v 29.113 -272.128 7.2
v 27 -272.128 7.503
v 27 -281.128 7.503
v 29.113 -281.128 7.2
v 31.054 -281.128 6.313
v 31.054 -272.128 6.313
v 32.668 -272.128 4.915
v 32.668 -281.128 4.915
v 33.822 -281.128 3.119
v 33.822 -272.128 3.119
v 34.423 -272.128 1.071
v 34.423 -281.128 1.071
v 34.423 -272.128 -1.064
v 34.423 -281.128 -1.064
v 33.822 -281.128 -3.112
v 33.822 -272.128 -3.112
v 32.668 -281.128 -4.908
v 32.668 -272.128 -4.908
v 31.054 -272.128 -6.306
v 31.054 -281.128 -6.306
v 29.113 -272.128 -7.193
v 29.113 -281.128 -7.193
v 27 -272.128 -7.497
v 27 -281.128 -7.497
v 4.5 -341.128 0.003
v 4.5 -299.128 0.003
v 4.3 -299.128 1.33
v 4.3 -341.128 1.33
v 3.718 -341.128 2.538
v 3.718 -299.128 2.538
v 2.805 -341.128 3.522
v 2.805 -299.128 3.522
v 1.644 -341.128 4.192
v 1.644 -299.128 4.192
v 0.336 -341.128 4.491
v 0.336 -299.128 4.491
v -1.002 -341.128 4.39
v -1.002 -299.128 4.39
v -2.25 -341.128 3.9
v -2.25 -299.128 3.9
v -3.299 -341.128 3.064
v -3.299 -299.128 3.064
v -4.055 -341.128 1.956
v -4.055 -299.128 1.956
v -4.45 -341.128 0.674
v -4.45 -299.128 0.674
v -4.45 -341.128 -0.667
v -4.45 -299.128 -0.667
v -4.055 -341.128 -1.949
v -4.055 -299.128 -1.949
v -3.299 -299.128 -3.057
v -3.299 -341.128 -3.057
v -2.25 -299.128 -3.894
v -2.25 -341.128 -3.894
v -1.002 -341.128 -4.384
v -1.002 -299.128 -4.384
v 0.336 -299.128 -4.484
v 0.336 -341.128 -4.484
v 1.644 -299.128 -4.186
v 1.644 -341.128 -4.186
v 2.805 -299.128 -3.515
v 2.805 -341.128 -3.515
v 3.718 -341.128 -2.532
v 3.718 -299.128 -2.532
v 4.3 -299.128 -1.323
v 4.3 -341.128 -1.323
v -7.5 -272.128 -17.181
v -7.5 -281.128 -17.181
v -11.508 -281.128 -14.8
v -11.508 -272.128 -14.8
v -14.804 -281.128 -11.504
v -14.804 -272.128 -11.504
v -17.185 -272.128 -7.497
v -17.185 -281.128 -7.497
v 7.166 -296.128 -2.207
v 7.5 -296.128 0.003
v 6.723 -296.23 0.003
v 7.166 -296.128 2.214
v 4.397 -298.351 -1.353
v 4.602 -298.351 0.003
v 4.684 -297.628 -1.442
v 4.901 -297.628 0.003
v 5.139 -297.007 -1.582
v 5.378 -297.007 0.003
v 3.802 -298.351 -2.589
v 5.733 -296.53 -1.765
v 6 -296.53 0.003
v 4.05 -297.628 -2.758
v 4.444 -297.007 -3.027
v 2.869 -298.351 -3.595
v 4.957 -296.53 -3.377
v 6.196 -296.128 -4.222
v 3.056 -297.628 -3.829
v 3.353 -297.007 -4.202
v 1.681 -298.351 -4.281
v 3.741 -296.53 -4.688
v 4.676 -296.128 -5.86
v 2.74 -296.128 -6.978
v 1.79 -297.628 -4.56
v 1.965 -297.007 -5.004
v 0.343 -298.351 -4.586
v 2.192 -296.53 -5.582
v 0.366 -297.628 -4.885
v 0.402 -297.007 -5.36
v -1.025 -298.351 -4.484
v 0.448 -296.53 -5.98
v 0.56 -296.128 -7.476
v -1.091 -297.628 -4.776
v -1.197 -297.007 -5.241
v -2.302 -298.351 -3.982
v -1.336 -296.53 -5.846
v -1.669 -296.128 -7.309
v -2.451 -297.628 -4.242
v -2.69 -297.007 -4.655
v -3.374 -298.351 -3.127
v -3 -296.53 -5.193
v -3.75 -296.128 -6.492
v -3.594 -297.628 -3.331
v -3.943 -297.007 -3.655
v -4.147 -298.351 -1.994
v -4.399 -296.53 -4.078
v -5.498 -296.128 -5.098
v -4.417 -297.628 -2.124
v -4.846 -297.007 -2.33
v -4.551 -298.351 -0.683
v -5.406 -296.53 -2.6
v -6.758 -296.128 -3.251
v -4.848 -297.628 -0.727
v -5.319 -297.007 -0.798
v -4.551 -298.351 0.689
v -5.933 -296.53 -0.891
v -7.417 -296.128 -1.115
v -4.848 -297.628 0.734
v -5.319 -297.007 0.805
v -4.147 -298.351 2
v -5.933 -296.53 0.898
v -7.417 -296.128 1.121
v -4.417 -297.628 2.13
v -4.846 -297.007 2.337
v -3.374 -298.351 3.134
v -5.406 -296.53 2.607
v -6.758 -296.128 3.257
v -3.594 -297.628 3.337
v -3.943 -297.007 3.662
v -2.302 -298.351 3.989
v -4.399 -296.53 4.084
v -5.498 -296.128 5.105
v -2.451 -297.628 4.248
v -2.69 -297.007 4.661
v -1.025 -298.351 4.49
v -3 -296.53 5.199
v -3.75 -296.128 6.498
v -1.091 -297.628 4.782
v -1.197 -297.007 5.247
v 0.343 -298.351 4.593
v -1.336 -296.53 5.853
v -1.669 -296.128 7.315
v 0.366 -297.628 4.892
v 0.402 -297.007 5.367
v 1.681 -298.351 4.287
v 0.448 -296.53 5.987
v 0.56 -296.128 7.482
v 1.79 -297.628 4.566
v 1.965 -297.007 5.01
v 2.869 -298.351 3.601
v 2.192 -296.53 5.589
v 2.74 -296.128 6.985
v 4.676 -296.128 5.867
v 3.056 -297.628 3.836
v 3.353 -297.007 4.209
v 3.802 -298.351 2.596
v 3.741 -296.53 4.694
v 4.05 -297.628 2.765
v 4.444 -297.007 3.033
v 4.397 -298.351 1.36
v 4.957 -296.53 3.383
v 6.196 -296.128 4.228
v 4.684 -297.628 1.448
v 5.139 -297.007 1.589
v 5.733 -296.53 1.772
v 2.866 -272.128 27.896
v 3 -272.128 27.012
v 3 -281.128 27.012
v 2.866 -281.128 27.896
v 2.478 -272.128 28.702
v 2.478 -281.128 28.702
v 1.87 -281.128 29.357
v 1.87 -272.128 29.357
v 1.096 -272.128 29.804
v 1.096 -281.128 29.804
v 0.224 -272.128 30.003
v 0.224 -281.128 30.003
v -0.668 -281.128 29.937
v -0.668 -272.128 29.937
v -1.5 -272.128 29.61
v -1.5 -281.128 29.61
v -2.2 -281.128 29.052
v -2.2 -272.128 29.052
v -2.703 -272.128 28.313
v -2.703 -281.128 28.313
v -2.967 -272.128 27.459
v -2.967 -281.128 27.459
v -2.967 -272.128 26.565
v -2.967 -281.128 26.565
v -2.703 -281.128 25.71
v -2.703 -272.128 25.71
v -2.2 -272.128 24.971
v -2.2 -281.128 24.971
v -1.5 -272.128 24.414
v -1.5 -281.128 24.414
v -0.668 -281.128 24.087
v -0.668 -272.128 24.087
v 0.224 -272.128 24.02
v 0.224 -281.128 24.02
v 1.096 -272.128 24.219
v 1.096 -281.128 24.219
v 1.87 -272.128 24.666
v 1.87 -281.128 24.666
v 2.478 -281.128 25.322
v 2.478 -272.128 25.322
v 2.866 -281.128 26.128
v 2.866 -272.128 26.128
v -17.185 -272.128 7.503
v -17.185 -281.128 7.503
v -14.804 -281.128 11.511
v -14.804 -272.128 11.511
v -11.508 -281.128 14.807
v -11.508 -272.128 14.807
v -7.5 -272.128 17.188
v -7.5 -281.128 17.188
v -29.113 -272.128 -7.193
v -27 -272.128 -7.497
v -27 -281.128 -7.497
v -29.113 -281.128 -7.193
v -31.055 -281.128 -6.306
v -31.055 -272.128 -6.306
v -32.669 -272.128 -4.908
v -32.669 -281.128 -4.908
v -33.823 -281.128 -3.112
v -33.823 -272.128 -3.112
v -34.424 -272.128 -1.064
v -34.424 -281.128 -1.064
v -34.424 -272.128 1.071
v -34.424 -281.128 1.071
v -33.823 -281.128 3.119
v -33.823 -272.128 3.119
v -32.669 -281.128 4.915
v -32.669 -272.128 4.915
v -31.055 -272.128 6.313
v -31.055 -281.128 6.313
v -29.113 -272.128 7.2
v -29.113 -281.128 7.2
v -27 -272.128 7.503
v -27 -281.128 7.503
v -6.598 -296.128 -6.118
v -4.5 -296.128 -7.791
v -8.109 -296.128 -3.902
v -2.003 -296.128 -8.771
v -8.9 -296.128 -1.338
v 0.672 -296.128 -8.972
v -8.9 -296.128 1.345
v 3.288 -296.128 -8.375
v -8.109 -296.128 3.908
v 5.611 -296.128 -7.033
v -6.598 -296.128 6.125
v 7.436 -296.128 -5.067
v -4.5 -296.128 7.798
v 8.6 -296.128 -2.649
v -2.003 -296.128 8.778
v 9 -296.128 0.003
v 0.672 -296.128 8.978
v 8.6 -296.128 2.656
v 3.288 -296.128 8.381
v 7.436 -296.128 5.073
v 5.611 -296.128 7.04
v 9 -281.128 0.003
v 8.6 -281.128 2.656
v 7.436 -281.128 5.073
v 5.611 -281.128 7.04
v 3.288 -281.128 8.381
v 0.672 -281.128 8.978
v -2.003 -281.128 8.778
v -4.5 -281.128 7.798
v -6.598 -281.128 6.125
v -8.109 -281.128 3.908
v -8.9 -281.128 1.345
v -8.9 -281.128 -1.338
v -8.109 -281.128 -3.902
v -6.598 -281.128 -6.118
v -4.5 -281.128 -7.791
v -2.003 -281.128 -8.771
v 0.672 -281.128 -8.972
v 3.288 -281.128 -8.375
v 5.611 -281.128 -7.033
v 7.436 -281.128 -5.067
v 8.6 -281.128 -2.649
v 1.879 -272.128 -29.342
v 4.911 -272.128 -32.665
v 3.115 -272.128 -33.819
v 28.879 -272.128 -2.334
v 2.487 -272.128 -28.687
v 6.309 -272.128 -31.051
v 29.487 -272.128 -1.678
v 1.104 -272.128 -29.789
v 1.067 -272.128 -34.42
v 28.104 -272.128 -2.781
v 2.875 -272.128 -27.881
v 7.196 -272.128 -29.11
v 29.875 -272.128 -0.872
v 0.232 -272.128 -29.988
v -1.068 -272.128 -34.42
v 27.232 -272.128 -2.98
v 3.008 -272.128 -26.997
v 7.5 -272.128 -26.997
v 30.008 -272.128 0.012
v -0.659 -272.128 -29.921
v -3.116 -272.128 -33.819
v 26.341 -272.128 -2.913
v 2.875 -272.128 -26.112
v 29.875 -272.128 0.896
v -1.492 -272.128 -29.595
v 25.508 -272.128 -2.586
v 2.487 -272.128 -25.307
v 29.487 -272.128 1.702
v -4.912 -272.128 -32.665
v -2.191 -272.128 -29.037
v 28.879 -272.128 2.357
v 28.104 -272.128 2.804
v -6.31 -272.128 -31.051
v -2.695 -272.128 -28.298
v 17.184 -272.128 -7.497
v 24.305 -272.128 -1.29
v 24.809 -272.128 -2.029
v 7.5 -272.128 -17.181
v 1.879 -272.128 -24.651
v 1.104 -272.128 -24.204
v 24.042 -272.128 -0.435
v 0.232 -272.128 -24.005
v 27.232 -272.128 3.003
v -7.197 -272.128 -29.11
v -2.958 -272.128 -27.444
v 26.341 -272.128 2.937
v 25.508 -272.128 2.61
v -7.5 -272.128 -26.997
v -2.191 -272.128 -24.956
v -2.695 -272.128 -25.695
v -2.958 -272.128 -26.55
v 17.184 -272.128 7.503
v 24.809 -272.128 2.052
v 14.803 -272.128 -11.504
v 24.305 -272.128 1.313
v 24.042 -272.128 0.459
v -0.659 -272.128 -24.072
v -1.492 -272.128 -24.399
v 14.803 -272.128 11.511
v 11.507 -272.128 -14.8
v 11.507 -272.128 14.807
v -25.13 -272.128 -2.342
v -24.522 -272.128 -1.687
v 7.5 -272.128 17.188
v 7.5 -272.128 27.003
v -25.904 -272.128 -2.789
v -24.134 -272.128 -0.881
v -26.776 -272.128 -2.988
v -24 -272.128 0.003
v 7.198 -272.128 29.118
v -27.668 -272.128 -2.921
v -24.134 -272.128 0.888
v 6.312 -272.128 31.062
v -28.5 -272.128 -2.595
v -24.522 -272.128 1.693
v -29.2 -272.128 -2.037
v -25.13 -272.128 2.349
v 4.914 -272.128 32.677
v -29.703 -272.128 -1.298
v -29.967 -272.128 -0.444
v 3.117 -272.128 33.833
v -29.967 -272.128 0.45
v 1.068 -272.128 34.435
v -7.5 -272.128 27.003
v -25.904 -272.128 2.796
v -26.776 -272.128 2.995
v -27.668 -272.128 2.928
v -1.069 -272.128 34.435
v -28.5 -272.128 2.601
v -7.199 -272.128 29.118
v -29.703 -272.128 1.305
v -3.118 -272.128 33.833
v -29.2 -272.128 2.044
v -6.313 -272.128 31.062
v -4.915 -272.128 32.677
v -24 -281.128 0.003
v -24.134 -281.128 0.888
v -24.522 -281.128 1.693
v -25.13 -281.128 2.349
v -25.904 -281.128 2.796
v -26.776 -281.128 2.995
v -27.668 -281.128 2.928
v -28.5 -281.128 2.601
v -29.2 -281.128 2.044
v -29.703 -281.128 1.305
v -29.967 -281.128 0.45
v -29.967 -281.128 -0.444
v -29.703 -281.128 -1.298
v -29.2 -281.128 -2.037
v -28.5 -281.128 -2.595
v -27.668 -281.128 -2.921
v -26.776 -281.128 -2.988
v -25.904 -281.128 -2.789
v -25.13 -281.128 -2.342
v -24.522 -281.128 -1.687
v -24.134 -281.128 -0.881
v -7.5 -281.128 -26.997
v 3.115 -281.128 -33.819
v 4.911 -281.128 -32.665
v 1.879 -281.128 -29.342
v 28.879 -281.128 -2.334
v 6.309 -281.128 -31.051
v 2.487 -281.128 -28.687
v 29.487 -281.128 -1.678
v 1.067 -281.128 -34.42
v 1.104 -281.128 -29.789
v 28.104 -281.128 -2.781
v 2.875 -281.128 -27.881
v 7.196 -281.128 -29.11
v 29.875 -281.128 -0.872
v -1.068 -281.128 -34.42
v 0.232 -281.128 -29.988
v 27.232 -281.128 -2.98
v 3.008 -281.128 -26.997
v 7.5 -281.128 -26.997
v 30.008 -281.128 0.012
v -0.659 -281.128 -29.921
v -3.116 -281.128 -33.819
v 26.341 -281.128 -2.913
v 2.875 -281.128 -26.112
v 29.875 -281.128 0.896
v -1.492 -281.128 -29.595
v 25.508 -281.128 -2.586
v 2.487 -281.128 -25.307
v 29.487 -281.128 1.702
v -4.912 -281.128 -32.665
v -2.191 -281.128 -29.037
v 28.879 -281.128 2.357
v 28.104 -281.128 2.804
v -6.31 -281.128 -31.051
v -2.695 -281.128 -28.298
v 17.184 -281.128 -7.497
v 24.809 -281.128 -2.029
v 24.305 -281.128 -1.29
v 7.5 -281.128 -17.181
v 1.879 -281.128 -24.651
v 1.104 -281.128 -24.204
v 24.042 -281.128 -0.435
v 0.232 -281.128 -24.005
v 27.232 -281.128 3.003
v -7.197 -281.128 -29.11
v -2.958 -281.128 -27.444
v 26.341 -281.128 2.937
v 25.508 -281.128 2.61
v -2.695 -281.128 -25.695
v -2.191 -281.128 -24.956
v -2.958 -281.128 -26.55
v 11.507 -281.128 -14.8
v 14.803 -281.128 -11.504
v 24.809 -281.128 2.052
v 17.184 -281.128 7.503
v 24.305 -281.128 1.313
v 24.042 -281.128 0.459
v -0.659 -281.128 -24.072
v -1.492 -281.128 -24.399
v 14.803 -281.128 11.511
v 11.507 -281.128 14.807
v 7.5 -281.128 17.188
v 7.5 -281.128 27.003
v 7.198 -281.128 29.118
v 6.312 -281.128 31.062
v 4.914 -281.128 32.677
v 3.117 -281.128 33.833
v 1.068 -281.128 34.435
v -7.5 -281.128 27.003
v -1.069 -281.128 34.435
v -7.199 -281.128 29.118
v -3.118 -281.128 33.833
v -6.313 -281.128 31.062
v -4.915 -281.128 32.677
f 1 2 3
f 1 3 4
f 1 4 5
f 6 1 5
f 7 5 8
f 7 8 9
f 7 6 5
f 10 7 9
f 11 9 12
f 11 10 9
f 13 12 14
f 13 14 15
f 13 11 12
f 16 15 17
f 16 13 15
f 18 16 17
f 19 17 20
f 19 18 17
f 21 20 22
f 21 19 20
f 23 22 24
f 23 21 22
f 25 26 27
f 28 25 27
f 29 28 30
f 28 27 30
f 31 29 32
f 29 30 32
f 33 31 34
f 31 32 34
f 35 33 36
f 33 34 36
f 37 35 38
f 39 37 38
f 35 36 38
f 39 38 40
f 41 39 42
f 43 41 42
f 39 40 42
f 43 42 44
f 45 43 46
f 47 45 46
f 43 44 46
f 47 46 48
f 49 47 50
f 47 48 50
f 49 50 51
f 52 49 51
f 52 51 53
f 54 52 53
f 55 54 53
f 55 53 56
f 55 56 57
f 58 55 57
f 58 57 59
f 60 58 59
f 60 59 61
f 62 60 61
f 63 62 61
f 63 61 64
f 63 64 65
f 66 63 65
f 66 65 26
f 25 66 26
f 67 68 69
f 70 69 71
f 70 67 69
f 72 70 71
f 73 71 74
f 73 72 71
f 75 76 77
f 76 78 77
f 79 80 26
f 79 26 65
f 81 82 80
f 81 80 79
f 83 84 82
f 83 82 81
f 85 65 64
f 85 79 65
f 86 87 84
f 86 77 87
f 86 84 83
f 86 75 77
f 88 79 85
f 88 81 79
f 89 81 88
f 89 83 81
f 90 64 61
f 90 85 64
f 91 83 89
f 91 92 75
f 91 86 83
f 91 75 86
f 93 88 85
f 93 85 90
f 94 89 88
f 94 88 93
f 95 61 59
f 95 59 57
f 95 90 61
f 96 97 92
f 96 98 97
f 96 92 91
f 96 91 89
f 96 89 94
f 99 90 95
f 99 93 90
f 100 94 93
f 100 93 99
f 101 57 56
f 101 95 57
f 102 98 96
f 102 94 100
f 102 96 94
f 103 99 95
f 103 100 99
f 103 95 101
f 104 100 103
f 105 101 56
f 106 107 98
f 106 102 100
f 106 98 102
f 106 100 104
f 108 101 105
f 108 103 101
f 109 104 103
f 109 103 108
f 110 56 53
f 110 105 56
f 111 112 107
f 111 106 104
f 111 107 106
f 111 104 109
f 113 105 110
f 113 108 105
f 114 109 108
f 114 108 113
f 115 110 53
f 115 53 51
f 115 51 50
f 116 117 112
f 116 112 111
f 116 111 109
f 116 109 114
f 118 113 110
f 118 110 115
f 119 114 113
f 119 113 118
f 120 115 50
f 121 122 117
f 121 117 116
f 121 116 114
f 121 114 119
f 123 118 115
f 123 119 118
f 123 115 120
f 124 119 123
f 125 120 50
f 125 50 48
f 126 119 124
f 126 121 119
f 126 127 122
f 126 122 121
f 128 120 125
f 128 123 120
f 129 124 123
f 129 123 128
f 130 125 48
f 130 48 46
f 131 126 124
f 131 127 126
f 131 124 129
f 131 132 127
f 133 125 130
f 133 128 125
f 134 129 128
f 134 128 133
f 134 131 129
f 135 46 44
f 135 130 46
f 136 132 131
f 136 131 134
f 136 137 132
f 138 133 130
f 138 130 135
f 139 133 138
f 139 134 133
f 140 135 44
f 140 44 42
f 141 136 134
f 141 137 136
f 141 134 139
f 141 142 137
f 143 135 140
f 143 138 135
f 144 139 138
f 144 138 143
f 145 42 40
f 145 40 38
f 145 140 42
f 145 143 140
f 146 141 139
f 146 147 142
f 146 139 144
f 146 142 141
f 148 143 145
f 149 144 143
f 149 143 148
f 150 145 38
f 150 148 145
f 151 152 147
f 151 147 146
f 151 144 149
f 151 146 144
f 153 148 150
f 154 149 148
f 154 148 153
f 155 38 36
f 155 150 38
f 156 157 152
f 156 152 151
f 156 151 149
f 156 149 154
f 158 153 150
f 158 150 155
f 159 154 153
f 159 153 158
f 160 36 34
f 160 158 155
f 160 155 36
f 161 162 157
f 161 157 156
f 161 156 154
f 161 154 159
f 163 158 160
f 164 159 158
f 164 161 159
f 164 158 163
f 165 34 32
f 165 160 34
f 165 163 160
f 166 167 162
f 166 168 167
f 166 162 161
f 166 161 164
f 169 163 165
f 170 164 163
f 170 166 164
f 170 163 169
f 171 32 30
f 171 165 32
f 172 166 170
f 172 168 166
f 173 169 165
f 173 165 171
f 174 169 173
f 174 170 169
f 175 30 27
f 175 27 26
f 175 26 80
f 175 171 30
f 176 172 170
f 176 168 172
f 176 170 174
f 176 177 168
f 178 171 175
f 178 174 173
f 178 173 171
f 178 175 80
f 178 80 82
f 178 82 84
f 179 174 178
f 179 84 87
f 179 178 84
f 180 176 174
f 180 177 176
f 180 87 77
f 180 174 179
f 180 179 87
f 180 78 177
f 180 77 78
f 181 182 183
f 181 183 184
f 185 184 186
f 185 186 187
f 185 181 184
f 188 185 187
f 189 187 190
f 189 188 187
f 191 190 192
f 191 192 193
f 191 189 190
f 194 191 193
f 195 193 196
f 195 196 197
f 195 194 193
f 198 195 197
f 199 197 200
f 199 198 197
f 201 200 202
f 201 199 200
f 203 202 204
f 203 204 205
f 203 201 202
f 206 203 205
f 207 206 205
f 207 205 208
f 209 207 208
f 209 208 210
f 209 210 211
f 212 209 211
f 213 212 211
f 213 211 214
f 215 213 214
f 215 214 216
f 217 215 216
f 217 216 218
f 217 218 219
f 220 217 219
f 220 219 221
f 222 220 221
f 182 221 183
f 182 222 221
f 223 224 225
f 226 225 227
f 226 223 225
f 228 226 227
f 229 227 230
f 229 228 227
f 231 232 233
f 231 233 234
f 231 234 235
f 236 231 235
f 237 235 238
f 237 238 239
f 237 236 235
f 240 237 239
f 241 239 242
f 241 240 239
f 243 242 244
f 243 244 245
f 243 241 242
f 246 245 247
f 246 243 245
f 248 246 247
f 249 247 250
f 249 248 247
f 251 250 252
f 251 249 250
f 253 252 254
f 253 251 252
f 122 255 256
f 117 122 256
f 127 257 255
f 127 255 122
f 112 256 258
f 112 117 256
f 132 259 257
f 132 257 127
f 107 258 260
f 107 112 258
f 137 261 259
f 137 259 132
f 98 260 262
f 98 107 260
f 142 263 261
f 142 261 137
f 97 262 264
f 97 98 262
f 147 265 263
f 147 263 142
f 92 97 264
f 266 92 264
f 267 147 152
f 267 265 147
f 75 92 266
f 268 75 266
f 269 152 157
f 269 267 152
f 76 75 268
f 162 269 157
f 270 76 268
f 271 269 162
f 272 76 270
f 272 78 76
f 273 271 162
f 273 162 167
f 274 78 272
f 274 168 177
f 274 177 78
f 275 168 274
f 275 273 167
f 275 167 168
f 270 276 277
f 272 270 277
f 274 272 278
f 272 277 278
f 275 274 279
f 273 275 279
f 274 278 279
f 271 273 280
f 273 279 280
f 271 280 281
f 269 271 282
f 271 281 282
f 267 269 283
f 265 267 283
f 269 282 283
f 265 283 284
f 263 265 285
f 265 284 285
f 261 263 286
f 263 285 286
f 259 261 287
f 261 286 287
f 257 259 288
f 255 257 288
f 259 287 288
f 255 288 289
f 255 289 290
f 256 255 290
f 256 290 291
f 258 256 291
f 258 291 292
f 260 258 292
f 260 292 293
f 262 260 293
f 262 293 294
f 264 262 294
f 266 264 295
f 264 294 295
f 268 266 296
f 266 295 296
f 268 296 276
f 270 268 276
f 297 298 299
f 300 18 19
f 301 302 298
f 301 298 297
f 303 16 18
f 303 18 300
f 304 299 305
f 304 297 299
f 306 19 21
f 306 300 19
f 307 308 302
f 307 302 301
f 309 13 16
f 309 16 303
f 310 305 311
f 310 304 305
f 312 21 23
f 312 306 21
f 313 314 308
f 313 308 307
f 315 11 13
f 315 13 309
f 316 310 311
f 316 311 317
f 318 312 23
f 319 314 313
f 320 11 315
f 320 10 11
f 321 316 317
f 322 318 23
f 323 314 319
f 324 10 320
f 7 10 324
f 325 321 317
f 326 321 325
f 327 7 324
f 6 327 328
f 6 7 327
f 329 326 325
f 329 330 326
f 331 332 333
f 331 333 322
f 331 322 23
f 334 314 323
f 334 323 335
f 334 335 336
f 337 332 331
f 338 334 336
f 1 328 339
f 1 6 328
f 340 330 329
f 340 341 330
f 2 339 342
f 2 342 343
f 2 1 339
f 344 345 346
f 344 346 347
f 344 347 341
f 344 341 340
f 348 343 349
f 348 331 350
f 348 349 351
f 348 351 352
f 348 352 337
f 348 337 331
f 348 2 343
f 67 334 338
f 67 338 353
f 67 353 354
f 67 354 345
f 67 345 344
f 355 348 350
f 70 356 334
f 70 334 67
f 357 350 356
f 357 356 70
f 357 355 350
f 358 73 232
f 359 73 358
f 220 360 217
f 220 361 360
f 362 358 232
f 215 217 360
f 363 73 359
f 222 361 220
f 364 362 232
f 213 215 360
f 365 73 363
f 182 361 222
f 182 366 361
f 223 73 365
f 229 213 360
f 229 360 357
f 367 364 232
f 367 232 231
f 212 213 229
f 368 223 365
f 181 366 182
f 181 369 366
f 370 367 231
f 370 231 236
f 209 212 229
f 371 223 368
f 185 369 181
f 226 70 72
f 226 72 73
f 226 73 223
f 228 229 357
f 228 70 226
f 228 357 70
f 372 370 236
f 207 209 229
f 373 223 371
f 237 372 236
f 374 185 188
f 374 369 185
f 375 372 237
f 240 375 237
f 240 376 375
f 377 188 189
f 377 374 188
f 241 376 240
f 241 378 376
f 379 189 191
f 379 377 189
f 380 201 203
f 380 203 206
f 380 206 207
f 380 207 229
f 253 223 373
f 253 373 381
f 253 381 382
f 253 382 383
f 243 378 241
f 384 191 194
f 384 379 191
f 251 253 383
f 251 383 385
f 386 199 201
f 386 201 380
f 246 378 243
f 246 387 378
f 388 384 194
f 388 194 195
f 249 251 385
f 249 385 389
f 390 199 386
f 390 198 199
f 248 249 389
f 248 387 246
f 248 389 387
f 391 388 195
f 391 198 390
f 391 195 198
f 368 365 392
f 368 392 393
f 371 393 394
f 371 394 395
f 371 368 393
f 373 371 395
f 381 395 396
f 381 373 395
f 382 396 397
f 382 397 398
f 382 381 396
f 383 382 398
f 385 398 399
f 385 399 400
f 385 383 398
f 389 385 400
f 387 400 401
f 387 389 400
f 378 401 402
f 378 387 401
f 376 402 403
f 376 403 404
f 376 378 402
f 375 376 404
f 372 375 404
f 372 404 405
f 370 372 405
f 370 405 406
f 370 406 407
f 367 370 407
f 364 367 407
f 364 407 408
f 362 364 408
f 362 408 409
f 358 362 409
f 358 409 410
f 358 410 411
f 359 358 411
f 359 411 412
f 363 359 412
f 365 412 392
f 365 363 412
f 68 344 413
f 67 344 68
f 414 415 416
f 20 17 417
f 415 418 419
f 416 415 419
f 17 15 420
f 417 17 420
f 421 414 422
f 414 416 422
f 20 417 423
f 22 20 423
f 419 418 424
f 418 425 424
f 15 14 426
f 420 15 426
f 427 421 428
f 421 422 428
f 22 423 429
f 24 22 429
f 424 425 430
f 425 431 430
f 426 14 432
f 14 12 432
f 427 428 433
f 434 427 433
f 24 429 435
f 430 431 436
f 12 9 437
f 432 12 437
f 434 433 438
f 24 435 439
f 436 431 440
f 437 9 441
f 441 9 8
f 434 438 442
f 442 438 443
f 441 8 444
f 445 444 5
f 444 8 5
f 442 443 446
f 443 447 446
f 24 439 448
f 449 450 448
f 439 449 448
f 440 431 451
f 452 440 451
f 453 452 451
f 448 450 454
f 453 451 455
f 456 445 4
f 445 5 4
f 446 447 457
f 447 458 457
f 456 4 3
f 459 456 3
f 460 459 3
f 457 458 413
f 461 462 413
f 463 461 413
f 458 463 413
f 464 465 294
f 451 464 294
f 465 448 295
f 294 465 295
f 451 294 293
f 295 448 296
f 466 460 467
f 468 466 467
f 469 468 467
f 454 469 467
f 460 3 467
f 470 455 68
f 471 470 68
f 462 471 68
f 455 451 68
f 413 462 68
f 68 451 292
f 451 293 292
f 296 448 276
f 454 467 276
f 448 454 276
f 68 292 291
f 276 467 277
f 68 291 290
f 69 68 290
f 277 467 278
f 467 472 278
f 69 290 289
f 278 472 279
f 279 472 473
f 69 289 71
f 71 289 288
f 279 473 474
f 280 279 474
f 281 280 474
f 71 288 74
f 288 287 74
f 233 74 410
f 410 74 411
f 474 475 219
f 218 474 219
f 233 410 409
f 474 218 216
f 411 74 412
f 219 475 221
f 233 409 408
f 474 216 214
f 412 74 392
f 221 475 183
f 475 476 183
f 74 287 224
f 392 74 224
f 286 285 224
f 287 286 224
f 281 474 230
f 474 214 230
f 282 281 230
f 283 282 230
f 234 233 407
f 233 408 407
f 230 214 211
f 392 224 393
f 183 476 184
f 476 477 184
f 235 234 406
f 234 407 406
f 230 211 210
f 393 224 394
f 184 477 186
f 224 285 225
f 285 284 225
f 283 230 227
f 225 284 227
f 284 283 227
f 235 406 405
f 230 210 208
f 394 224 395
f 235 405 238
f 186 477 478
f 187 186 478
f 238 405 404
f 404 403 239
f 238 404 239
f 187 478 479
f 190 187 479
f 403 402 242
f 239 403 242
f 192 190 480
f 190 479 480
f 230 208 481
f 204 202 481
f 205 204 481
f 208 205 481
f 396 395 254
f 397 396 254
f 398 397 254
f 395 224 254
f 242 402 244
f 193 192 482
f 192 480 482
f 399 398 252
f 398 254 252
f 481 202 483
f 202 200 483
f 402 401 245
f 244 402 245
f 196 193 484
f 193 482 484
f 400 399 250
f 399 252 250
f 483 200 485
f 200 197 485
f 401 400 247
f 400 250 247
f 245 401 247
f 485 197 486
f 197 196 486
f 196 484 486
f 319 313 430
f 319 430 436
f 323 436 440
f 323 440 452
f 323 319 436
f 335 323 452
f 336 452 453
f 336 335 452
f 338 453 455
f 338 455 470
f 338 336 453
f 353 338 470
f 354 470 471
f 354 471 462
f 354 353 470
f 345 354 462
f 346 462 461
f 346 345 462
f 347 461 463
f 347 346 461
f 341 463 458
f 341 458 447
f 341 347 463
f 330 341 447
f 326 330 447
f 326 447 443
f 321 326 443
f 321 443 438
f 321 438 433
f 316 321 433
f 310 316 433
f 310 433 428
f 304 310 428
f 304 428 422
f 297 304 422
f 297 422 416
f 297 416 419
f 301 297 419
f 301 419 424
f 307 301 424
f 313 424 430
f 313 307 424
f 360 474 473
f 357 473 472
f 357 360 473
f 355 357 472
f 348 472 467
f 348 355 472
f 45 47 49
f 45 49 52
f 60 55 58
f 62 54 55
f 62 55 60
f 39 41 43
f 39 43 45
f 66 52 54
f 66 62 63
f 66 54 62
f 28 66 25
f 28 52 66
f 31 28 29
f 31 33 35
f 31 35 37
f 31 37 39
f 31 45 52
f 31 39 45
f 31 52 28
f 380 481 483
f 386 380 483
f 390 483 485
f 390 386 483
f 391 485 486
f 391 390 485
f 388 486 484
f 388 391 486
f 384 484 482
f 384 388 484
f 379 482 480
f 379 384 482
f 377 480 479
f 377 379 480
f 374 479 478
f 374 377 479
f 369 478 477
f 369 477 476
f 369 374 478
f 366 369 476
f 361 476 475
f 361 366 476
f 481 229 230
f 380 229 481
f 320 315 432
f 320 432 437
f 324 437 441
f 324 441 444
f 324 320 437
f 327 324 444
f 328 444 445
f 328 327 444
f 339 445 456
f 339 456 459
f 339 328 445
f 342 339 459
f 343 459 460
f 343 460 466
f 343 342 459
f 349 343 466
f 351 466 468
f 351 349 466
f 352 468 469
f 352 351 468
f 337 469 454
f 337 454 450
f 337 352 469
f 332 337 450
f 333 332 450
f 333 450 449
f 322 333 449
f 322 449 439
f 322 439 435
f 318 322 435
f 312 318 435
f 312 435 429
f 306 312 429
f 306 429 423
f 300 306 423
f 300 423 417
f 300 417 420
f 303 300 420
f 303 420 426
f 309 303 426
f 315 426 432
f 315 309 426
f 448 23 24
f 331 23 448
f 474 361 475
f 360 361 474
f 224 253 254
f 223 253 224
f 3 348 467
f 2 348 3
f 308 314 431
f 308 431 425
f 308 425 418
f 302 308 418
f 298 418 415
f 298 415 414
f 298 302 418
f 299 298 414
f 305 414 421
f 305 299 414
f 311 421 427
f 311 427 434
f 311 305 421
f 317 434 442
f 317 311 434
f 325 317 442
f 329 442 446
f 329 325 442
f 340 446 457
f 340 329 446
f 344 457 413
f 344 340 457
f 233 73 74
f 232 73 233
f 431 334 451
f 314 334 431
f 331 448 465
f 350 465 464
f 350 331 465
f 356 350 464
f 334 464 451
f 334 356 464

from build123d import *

# Parameters (mm, degrees)
SKETCH2_R           = 10
BOSS_EXTRUDE1_DEPTH = 30
SKETCH3_R           = 30
BOSS_EXTRUDE2_DEPTH = 50
SKETCH3_3_R         = 15
BOSS_EXTRUDE3_DEPTH = 200
FILLET1_R           = 10
SCALE1_SCALE        = 0.3


with BuildPart() as part:
    # Sketch2 → Boss-Extrude1 (new body)
    with BuildSketch(Plane.XZ.offset(245.071627094)):
        with BuildLine():
            Line((57.282196187, 25), (90, 25))
            ThreePointArc((90, 25), (115, 0), (90, -25))
            Line((90, -25), (57.282196187, -25))
            ThreePointArc((57.282196187, -25), (44.194173824, -44.194173824), (25, -57.282196187))
            Line((25, -57.282196187), (25, -90))
            ThreePointArc((25, -90), (0, -115), (-25, -90))
            Line((-25, -90), (-25, -57.282196187))
            ThreePointArc((-25, -57.282196187), (-44.194173824, -44.194173824), (-57.282196187, -25))
            Line((-57.282196187, -25), (-90, -25))
            ThreePointArc((-90, -25), (-115, 0), (-90, 25))
            Line((-90, 25), (-57.282196187, 25))
            ThreePointArc((-57.282196187, 25), (-44.194173824, 44.194173824), (-25, 57.282196187))
            Line((-25, 57.282196187), (-25, 90))
            ThreePointArc((-25, 90), (0, 115.02832634), (25, 90))
            Line((25, 90), (25, 57.282196187))
            ThreePointArc((25, 57.282196187), (44.194173824, 44.194173824), (57.282196187, 25))
        make_face()
        with Locations((0, 90.028310311)):
            Circle(SKETCH2_R, mode=Mode.SUBTRACT)
        with Locations((90.028310311, 0.028310311)):
            Circle(SKETCH2_R, mode=Mode.SUBTRACT)
        with Locations((0.028310311, -90)):
            Circle(SKETCH2_R, mode=Mode.SUBTRACT)
        with Locations((-90, 0)):
            Circle(SKETCH2_R, mode=Mode.SUBTRACT)
    extrude(amount=BOSS_EXTRUDE1_DEPTH)

    # Sketch3 → Boss-Extrude2 (add)
    with BuildSketch(Plane.XZ.offset(275.071627094)):
        Circle(SKETCH3_R)
    extrude(amount=BOSS_EXTRUDE2_DEPTH)

    # Sketch3<3> → Boss-Extrude3 (add)
    with BuildSketch(Plane.XZ.offset(275.071627094)):
        Circle(SKETCH3_3_R)
    extrude(amount=BOSS_EXTRUDE3_DEPTH)

    # Fillet1
    fillet1_edges = [part.edges().sort_by_distance(p)[0] for p in [
        (-15, -325.071627094, 0),
    ]]
    fillet(fillet1_edges, radius=FILLET1_R)


with BuildPart() as part_1:
    # Scale1: scaled about (-0.000611067, -283.723455746, 0.004725438)
    add(part.part.scale(SCALE1_SCALE).moved(Location((-0.000427747, -198.606419022, 0.003307807))))


solid = part_1.part
